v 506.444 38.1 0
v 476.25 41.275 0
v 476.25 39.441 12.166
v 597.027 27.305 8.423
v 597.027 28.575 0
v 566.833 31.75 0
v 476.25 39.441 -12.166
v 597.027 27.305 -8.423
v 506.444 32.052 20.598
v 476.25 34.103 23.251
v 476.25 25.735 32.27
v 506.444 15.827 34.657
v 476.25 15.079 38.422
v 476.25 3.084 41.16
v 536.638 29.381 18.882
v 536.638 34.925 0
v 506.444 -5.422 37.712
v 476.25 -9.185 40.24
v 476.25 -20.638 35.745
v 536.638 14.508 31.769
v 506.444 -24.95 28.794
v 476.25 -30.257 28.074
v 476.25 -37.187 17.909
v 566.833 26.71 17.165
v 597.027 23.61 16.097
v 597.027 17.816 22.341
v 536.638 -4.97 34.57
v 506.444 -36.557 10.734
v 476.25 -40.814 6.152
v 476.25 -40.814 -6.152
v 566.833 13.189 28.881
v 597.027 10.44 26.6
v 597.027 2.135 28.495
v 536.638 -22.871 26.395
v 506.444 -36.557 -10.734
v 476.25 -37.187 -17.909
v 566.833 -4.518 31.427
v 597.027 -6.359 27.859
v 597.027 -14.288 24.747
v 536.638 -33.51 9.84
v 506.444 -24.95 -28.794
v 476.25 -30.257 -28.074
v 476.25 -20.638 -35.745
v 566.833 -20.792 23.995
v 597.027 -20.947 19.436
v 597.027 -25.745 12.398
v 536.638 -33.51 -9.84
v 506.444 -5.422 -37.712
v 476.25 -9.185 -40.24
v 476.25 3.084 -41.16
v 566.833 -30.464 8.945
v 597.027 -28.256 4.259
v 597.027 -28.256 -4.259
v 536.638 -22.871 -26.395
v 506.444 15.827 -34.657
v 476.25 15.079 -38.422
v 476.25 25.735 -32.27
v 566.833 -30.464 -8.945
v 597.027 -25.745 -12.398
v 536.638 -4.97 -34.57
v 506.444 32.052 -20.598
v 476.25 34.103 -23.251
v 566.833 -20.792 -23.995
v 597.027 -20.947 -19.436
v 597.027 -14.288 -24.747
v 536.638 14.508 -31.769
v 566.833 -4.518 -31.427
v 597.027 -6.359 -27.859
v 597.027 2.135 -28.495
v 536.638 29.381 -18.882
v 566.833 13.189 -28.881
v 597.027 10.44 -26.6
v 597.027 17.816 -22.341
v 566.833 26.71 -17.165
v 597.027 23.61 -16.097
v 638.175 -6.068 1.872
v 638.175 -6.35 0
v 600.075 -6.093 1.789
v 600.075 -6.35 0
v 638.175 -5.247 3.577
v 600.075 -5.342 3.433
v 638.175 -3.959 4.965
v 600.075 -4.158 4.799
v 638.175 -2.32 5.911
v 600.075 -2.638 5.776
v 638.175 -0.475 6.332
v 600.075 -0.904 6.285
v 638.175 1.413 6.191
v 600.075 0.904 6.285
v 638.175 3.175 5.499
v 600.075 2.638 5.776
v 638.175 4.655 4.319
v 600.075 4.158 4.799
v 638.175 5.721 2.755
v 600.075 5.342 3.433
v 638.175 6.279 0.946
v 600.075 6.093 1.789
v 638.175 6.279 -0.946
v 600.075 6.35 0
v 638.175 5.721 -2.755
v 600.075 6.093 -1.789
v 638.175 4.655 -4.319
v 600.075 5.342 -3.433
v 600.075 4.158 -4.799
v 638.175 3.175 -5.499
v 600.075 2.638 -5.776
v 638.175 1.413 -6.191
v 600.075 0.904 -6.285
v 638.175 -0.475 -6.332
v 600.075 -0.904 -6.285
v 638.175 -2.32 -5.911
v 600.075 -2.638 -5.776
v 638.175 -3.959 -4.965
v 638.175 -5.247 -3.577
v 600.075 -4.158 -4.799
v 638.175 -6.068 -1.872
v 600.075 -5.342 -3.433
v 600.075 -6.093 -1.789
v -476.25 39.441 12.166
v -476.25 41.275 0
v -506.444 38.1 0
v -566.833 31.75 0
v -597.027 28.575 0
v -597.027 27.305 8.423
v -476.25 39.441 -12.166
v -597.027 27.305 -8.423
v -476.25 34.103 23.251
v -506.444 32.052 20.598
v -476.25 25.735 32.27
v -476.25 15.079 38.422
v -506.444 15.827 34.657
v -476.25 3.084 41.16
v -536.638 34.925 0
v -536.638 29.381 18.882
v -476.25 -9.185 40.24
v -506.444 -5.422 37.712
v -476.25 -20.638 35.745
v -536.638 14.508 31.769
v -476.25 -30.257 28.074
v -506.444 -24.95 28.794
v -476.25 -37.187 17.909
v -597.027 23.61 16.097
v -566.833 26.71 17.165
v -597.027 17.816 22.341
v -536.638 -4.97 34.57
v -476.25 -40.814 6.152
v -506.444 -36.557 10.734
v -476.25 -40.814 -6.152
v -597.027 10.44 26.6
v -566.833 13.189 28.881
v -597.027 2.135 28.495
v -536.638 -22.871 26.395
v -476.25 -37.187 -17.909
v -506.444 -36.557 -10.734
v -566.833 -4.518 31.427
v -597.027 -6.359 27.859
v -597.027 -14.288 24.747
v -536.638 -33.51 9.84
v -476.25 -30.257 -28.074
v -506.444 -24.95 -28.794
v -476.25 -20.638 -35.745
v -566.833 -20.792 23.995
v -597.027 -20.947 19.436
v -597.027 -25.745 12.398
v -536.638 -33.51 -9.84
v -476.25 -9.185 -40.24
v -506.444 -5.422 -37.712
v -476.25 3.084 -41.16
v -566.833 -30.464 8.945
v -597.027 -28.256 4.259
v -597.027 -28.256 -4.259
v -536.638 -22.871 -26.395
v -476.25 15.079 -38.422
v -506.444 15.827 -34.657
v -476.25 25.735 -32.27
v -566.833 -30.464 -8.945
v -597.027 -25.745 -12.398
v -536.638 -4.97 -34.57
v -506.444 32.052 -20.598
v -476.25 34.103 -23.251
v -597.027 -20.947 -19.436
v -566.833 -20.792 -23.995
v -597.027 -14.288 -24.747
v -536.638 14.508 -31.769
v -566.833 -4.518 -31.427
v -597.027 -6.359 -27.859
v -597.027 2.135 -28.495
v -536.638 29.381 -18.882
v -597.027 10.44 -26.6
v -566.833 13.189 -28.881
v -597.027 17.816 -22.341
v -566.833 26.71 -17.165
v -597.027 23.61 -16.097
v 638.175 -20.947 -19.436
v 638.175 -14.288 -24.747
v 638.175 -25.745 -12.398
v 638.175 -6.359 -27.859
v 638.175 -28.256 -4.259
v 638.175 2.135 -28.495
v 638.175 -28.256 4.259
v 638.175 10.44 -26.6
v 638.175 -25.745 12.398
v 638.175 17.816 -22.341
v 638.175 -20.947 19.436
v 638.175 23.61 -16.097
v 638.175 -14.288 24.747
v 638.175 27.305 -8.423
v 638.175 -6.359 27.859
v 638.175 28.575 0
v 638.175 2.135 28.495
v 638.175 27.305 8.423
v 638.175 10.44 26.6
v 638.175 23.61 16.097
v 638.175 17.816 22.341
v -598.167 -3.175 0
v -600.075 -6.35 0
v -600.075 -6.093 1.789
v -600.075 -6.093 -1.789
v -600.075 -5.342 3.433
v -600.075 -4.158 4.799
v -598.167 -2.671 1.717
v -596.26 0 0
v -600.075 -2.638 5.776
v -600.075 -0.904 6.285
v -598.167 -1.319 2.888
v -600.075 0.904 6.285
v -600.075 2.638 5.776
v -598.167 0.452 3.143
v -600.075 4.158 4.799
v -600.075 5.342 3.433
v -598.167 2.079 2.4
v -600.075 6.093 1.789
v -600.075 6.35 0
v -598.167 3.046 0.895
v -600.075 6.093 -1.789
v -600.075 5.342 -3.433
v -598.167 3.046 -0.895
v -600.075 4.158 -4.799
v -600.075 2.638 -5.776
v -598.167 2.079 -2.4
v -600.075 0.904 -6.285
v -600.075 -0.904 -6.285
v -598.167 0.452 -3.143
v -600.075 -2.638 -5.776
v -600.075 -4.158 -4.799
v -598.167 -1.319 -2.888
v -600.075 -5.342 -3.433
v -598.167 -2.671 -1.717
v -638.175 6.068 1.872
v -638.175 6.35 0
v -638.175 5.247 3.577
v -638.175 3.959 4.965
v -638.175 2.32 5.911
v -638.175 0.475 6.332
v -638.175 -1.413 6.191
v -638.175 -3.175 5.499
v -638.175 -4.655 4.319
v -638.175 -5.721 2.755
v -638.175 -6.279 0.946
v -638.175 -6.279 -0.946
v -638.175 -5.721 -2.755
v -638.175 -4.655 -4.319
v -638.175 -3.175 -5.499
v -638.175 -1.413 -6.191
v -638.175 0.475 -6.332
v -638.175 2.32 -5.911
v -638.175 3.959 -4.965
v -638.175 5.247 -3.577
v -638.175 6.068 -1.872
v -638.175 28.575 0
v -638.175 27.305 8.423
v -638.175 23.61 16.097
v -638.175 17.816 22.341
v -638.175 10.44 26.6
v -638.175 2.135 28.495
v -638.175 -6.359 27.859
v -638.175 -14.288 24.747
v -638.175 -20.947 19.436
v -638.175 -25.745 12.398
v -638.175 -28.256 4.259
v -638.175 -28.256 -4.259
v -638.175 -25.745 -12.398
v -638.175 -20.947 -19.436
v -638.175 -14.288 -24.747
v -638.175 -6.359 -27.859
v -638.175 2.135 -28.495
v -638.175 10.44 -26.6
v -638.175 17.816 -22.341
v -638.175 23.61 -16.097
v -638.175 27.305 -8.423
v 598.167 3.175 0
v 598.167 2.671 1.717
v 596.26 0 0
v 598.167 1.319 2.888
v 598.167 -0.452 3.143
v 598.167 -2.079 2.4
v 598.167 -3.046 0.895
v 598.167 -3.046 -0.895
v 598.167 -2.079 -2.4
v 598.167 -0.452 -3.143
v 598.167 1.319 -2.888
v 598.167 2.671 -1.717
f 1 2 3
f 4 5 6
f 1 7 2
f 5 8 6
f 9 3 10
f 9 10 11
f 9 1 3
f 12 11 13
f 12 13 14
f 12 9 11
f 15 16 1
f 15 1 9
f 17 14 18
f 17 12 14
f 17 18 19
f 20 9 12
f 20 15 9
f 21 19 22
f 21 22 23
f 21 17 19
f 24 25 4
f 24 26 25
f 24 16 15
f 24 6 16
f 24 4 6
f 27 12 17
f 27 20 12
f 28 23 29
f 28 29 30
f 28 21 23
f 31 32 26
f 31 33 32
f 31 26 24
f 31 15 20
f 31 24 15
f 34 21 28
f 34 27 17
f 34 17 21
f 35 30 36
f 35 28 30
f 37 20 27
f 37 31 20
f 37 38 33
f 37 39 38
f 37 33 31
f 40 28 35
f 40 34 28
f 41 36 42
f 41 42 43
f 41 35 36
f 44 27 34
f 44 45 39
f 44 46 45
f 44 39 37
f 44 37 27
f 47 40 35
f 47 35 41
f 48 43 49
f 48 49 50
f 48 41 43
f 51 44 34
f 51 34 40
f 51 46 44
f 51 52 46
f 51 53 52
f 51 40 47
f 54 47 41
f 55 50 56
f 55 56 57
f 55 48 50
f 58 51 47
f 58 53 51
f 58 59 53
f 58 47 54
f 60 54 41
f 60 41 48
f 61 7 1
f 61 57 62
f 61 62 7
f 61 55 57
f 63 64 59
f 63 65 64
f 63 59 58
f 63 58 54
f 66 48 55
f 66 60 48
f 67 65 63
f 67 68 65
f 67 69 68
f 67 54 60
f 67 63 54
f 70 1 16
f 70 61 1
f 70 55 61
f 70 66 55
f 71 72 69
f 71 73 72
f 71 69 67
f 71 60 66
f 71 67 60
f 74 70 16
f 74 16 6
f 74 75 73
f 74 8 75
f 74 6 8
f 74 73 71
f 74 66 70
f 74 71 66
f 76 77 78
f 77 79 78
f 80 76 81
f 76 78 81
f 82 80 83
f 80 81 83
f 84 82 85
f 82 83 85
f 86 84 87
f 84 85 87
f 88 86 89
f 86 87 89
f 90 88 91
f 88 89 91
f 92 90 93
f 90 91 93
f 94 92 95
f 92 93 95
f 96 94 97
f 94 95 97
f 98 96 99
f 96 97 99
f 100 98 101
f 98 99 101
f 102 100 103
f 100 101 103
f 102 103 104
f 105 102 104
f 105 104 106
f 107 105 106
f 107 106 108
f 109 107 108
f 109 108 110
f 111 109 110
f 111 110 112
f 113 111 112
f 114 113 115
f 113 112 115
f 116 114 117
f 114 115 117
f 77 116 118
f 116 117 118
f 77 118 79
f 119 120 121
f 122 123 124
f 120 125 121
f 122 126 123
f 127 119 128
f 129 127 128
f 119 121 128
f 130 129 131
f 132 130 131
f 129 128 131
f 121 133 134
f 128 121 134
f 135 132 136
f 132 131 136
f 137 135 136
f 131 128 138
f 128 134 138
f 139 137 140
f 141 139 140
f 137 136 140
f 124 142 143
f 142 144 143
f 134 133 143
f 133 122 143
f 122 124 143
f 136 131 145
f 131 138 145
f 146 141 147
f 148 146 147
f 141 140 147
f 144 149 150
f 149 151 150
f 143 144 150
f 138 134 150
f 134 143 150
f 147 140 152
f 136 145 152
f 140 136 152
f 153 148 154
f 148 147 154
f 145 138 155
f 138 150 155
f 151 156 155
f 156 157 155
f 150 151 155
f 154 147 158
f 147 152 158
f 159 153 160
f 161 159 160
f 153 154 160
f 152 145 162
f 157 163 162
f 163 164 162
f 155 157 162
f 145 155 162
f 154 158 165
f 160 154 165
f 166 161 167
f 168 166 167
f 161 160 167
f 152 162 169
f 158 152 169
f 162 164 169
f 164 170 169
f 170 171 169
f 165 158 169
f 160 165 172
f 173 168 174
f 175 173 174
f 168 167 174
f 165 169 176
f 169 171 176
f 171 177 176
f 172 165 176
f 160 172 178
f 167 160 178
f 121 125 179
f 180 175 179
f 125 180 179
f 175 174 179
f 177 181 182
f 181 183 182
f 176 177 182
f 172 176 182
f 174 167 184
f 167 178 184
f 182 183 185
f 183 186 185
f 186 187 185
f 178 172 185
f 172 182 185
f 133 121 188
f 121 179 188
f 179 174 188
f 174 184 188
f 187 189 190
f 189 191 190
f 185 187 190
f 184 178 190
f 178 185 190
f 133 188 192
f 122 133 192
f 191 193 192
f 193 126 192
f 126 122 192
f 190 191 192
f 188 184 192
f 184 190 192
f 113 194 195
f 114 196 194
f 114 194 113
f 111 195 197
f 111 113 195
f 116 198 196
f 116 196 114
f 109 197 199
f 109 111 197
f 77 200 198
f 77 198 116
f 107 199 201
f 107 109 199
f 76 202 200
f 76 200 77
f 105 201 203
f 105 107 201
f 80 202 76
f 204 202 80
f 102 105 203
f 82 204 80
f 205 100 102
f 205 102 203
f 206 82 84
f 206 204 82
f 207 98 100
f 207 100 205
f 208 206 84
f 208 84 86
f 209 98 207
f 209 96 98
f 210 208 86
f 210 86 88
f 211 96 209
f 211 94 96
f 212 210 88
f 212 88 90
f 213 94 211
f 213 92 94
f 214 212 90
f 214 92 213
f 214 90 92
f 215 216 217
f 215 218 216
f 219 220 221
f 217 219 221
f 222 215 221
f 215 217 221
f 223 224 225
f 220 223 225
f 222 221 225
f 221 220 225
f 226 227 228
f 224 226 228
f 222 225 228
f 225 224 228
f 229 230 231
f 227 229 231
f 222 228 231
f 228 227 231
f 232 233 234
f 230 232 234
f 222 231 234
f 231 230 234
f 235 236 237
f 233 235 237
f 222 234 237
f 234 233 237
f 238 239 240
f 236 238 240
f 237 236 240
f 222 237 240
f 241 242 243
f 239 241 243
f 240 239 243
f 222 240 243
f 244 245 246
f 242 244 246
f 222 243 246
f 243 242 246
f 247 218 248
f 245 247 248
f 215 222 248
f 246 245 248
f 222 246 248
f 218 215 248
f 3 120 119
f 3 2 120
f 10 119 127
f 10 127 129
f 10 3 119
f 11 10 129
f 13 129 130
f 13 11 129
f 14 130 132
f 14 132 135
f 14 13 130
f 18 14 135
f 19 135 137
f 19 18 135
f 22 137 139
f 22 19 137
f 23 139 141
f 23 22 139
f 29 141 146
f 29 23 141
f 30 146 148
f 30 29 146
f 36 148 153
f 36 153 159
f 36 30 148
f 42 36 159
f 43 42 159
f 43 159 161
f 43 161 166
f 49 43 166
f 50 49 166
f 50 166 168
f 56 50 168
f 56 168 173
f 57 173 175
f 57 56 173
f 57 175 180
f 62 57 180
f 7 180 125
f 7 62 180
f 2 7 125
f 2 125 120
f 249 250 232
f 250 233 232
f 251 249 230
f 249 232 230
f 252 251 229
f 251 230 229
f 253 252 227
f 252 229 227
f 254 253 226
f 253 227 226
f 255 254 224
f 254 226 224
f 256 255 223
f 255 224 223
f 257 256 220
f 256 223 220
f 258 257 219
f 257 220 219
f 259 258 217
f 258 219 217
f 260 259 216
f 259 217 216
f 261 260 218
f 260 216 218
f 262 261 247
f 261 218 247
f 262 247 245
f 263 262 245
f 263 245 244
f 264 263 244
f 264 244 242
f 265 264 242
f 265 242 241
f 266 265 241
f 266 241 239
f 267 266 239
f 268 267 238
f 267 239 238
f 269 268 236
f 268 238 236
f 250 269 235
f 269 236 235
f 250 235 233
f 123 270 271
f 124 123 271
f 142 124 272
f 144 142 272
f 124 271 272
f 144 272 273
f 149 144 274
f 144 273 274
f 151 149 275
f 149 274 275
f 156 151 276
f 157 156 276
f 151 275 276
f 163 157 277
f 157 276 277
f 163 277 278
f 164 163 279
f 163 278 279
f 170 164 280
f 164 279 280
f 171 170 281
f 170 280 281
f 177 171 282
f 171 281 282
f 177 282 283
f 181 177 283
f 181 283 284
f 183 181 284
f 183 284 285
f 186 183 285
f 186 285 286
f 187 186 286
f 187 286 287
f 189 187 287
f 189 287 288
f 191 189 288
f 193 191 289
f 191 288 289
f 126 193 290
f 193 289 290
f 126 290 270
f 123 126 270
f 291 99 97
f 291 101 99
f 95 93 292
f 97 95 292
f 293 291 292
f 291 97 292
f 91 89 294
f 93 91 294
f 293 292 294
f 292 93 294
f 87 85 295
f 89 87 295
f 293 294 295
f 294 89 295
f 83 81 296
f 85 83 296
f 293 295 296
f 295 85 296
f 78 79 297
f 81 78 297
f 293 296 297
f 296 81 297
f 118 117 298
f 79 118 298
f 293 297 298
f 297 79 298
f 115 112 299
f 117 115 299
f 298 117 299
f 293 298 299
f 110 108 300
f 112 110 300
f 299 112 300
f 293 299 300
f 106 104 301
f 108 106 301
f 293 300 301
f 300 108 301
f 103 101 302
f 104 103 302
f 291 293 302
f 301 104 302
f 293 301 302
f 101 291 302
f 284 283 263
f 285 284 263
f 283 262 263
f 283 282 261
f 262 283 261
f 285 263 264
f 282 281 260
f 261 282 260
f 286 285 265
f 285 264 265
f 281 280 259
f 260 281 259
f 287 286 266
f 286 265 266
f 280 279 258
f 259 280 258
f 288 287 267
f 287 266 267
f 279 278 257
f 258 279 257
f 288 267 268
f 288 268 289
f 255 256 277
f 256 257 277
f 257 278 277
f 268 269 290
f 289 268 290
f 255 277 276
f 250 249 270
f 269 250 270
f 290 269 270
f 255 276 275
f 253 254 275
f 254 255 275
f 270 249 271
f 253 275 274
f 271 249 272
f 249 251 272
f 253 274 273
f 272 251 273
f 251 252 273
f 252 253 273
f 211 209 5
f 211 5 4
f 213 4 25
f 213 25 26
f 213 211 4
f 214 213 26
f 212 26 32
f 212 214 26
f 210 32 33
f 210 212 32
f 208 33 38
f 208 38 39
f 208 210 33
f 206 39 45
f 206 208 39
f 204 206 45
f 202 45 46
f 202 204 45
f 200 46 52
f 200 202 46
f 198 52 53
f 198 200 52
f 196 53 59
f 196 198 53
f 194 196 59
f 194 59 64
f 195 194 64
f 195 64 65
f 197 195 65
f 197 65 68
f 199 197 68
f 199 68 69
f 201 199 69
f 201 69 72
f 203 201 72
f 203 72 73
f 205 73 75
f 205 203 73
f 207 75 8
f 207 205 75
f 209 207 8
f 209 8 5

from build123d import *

# Parameters (mm, degrees)
F0_R           = 41.275
F1_DEPTH       = 476.25
F3_R           = 28.575
F4_DEPTH       = 41.148
F1_FACE_R      = 41.275
F4_FACE_R      = 28.575
F9_D           = 12.7
F9_DEPTH       = 38.1
F9_TIP         = 3.8154649308
F9_ON_F7_D     = 12.7
F9_ON_F7_DEPTH = 38.1
F9_ON_F7_TIP   = 3.8154649308


with BuildPart() as f1:
    # F0 (on Right) → F1 (new body, symmetric)
    with BuildSketch(Plane.YZ):
        Circle(F0_R)
    extrude(amount=F1_DEPTH, both=True)



with BuildPart() as f4:
    # F3 (on offset) → F4 (new body)
    with BuildSketch(Plane.YZ.offset(638.175)):
        Circle(F3_R)
    extrude(amount=-F4_DEPTH)


with BuildPart() as f1_1:
    add(f1.part)

    add(f4.part)  # F5 merges F4
    # F1_face (on face) → F5 section 0
    with BuildSketch(Plane.YZ.offset(476.25)):
        Circle(F1_FACE_R)
    # F4_face (on face) → F5 section 1
    with BuildSketch(Plane(origin=(597.027, 0, 0), x_dir=(0, 1, 0), z_dir=(-1, 0, 0))):
        Circle(F4_FACE_R)
    loft()

    # F6: F1 across plane


with BuildPart() as f1_2:
    add(f1_1.part)
    add(f1_1.part.mirror(Plane.YZ))

    # F9
    with Locations(Plane(origin=(-638.175, 0, 0), x_dir=(0, -1, 0), z_dir=(-1, 0, 0))):
        with Locations((0, 0)):
            Hole(F9_D / 2, depth=F9_DEPTH)
            with Locations((0, 0, -(F9_DEPTH + F9_TIP / 2))):  # 118° drill point
                Cone(0, F9_D / 2, F9_TIP, mode=Mode.SUBTRACT)

    # F9 on F7
    with Locations(Plane.YZ.offset(638.175)):
        with Locations((0, 0)):
            Hole(F9_ON_F7_D / 2, depth=F9_ON_F7_DEPTH)
            with Locations((0, 0, -(F9_ON_F7_DEPTH + F9_ON_F7_TIP / 2))):  # 118° drill point
                Cone(0, F9_ON_F7_D / 2, F9_ON_F7_TIP, mode=Mode.SUBTRACT)


solid = f1_2.part
